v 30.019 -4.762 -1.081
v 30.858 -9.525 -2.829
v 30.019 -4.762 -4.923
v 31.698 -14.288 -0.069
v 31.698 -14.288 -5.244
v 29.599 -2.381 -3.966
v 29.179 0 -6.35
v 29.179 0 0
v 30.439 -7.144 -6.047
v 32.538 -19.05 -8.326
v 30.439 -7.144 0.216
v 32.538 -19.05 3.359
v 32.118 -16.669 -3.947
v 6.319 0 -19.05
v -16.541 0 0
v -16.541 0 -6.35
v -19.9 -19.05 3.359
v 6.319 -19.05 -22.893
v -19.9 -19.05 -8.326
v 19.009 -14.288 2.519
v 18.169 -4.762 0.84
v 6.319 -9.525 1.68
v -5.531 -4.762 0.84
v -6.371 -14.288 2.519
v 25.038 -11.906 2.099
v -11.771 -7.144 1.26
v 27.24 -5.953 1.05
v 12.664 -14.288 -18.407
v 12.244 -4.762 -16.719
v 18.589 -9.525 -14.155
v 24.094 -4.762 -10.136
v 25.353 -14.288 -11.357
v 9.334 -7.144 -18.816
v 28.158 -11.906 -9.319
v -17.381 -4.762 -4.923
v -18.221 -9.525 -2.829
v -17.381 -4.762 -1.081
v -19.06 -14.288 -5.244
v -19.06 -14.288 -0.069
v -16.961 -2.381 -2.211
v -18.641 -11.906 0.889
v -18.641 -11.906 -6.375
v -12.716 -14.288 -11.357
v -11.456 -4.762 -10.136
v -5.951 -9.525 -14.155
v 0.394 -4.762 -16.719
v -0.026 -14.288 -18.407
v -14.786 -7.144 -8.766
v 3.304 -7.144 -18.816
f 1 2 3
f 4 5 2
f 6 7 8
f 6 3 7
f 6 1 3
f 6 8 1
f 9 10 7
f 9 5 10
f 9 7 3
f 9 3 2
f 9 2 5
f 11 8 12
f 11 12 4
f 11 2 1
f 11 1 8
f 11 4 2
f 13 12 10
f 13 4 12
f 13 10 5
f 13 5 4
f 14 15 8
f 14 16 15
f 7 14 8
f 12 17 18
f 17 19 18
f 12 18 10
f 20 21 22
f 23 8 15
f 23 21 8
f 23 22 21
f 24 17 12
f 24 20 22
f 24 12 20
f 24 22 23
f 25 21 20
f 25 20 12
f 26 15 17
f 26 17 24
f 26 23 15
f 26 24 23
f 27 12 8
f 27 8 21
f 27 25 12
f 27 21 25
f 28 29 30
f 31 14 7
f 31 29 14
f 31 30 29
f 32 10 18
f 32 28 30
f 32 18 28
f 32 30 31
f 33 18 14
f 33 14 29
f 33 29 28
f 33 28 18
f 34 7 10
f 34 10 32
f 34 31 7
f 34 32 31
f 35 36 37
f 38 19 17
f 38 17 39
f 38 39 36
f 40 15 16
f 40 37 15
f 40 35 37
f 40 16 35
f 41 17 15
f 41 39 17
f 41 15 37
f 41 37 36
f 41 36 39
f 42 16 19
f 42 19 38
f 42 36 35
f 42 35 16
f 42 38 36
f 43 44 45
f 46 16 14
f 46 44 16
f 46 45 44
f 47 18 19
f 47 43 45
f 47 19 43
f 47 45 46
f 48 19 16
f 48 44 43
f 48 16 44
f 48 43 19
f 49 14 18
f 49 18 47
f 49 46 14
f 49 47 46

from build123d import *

# Parameters (mm, degrees)
F1_DEPTH = 19.05
F1_TAPER = -10


with BuildPart() as f1:
    # F0 (on Front) → F1 (new body)
    with BuildSketch(Plane.XZ):
        Polygon((6.3188821977, 0), (-16.5411178023, 0), (-16.5411178023, -6.35), (6.3188821977, -19.05), align=None)
        Polygon((29.1788821977, 0), (6.3188821977, 0), (6.3188821977, -19.05), (29.1788821977, -6.35), align=None)
    extrude(amount=F1_DEPTH, taper=F1_TAPER)


solid = f1.part
